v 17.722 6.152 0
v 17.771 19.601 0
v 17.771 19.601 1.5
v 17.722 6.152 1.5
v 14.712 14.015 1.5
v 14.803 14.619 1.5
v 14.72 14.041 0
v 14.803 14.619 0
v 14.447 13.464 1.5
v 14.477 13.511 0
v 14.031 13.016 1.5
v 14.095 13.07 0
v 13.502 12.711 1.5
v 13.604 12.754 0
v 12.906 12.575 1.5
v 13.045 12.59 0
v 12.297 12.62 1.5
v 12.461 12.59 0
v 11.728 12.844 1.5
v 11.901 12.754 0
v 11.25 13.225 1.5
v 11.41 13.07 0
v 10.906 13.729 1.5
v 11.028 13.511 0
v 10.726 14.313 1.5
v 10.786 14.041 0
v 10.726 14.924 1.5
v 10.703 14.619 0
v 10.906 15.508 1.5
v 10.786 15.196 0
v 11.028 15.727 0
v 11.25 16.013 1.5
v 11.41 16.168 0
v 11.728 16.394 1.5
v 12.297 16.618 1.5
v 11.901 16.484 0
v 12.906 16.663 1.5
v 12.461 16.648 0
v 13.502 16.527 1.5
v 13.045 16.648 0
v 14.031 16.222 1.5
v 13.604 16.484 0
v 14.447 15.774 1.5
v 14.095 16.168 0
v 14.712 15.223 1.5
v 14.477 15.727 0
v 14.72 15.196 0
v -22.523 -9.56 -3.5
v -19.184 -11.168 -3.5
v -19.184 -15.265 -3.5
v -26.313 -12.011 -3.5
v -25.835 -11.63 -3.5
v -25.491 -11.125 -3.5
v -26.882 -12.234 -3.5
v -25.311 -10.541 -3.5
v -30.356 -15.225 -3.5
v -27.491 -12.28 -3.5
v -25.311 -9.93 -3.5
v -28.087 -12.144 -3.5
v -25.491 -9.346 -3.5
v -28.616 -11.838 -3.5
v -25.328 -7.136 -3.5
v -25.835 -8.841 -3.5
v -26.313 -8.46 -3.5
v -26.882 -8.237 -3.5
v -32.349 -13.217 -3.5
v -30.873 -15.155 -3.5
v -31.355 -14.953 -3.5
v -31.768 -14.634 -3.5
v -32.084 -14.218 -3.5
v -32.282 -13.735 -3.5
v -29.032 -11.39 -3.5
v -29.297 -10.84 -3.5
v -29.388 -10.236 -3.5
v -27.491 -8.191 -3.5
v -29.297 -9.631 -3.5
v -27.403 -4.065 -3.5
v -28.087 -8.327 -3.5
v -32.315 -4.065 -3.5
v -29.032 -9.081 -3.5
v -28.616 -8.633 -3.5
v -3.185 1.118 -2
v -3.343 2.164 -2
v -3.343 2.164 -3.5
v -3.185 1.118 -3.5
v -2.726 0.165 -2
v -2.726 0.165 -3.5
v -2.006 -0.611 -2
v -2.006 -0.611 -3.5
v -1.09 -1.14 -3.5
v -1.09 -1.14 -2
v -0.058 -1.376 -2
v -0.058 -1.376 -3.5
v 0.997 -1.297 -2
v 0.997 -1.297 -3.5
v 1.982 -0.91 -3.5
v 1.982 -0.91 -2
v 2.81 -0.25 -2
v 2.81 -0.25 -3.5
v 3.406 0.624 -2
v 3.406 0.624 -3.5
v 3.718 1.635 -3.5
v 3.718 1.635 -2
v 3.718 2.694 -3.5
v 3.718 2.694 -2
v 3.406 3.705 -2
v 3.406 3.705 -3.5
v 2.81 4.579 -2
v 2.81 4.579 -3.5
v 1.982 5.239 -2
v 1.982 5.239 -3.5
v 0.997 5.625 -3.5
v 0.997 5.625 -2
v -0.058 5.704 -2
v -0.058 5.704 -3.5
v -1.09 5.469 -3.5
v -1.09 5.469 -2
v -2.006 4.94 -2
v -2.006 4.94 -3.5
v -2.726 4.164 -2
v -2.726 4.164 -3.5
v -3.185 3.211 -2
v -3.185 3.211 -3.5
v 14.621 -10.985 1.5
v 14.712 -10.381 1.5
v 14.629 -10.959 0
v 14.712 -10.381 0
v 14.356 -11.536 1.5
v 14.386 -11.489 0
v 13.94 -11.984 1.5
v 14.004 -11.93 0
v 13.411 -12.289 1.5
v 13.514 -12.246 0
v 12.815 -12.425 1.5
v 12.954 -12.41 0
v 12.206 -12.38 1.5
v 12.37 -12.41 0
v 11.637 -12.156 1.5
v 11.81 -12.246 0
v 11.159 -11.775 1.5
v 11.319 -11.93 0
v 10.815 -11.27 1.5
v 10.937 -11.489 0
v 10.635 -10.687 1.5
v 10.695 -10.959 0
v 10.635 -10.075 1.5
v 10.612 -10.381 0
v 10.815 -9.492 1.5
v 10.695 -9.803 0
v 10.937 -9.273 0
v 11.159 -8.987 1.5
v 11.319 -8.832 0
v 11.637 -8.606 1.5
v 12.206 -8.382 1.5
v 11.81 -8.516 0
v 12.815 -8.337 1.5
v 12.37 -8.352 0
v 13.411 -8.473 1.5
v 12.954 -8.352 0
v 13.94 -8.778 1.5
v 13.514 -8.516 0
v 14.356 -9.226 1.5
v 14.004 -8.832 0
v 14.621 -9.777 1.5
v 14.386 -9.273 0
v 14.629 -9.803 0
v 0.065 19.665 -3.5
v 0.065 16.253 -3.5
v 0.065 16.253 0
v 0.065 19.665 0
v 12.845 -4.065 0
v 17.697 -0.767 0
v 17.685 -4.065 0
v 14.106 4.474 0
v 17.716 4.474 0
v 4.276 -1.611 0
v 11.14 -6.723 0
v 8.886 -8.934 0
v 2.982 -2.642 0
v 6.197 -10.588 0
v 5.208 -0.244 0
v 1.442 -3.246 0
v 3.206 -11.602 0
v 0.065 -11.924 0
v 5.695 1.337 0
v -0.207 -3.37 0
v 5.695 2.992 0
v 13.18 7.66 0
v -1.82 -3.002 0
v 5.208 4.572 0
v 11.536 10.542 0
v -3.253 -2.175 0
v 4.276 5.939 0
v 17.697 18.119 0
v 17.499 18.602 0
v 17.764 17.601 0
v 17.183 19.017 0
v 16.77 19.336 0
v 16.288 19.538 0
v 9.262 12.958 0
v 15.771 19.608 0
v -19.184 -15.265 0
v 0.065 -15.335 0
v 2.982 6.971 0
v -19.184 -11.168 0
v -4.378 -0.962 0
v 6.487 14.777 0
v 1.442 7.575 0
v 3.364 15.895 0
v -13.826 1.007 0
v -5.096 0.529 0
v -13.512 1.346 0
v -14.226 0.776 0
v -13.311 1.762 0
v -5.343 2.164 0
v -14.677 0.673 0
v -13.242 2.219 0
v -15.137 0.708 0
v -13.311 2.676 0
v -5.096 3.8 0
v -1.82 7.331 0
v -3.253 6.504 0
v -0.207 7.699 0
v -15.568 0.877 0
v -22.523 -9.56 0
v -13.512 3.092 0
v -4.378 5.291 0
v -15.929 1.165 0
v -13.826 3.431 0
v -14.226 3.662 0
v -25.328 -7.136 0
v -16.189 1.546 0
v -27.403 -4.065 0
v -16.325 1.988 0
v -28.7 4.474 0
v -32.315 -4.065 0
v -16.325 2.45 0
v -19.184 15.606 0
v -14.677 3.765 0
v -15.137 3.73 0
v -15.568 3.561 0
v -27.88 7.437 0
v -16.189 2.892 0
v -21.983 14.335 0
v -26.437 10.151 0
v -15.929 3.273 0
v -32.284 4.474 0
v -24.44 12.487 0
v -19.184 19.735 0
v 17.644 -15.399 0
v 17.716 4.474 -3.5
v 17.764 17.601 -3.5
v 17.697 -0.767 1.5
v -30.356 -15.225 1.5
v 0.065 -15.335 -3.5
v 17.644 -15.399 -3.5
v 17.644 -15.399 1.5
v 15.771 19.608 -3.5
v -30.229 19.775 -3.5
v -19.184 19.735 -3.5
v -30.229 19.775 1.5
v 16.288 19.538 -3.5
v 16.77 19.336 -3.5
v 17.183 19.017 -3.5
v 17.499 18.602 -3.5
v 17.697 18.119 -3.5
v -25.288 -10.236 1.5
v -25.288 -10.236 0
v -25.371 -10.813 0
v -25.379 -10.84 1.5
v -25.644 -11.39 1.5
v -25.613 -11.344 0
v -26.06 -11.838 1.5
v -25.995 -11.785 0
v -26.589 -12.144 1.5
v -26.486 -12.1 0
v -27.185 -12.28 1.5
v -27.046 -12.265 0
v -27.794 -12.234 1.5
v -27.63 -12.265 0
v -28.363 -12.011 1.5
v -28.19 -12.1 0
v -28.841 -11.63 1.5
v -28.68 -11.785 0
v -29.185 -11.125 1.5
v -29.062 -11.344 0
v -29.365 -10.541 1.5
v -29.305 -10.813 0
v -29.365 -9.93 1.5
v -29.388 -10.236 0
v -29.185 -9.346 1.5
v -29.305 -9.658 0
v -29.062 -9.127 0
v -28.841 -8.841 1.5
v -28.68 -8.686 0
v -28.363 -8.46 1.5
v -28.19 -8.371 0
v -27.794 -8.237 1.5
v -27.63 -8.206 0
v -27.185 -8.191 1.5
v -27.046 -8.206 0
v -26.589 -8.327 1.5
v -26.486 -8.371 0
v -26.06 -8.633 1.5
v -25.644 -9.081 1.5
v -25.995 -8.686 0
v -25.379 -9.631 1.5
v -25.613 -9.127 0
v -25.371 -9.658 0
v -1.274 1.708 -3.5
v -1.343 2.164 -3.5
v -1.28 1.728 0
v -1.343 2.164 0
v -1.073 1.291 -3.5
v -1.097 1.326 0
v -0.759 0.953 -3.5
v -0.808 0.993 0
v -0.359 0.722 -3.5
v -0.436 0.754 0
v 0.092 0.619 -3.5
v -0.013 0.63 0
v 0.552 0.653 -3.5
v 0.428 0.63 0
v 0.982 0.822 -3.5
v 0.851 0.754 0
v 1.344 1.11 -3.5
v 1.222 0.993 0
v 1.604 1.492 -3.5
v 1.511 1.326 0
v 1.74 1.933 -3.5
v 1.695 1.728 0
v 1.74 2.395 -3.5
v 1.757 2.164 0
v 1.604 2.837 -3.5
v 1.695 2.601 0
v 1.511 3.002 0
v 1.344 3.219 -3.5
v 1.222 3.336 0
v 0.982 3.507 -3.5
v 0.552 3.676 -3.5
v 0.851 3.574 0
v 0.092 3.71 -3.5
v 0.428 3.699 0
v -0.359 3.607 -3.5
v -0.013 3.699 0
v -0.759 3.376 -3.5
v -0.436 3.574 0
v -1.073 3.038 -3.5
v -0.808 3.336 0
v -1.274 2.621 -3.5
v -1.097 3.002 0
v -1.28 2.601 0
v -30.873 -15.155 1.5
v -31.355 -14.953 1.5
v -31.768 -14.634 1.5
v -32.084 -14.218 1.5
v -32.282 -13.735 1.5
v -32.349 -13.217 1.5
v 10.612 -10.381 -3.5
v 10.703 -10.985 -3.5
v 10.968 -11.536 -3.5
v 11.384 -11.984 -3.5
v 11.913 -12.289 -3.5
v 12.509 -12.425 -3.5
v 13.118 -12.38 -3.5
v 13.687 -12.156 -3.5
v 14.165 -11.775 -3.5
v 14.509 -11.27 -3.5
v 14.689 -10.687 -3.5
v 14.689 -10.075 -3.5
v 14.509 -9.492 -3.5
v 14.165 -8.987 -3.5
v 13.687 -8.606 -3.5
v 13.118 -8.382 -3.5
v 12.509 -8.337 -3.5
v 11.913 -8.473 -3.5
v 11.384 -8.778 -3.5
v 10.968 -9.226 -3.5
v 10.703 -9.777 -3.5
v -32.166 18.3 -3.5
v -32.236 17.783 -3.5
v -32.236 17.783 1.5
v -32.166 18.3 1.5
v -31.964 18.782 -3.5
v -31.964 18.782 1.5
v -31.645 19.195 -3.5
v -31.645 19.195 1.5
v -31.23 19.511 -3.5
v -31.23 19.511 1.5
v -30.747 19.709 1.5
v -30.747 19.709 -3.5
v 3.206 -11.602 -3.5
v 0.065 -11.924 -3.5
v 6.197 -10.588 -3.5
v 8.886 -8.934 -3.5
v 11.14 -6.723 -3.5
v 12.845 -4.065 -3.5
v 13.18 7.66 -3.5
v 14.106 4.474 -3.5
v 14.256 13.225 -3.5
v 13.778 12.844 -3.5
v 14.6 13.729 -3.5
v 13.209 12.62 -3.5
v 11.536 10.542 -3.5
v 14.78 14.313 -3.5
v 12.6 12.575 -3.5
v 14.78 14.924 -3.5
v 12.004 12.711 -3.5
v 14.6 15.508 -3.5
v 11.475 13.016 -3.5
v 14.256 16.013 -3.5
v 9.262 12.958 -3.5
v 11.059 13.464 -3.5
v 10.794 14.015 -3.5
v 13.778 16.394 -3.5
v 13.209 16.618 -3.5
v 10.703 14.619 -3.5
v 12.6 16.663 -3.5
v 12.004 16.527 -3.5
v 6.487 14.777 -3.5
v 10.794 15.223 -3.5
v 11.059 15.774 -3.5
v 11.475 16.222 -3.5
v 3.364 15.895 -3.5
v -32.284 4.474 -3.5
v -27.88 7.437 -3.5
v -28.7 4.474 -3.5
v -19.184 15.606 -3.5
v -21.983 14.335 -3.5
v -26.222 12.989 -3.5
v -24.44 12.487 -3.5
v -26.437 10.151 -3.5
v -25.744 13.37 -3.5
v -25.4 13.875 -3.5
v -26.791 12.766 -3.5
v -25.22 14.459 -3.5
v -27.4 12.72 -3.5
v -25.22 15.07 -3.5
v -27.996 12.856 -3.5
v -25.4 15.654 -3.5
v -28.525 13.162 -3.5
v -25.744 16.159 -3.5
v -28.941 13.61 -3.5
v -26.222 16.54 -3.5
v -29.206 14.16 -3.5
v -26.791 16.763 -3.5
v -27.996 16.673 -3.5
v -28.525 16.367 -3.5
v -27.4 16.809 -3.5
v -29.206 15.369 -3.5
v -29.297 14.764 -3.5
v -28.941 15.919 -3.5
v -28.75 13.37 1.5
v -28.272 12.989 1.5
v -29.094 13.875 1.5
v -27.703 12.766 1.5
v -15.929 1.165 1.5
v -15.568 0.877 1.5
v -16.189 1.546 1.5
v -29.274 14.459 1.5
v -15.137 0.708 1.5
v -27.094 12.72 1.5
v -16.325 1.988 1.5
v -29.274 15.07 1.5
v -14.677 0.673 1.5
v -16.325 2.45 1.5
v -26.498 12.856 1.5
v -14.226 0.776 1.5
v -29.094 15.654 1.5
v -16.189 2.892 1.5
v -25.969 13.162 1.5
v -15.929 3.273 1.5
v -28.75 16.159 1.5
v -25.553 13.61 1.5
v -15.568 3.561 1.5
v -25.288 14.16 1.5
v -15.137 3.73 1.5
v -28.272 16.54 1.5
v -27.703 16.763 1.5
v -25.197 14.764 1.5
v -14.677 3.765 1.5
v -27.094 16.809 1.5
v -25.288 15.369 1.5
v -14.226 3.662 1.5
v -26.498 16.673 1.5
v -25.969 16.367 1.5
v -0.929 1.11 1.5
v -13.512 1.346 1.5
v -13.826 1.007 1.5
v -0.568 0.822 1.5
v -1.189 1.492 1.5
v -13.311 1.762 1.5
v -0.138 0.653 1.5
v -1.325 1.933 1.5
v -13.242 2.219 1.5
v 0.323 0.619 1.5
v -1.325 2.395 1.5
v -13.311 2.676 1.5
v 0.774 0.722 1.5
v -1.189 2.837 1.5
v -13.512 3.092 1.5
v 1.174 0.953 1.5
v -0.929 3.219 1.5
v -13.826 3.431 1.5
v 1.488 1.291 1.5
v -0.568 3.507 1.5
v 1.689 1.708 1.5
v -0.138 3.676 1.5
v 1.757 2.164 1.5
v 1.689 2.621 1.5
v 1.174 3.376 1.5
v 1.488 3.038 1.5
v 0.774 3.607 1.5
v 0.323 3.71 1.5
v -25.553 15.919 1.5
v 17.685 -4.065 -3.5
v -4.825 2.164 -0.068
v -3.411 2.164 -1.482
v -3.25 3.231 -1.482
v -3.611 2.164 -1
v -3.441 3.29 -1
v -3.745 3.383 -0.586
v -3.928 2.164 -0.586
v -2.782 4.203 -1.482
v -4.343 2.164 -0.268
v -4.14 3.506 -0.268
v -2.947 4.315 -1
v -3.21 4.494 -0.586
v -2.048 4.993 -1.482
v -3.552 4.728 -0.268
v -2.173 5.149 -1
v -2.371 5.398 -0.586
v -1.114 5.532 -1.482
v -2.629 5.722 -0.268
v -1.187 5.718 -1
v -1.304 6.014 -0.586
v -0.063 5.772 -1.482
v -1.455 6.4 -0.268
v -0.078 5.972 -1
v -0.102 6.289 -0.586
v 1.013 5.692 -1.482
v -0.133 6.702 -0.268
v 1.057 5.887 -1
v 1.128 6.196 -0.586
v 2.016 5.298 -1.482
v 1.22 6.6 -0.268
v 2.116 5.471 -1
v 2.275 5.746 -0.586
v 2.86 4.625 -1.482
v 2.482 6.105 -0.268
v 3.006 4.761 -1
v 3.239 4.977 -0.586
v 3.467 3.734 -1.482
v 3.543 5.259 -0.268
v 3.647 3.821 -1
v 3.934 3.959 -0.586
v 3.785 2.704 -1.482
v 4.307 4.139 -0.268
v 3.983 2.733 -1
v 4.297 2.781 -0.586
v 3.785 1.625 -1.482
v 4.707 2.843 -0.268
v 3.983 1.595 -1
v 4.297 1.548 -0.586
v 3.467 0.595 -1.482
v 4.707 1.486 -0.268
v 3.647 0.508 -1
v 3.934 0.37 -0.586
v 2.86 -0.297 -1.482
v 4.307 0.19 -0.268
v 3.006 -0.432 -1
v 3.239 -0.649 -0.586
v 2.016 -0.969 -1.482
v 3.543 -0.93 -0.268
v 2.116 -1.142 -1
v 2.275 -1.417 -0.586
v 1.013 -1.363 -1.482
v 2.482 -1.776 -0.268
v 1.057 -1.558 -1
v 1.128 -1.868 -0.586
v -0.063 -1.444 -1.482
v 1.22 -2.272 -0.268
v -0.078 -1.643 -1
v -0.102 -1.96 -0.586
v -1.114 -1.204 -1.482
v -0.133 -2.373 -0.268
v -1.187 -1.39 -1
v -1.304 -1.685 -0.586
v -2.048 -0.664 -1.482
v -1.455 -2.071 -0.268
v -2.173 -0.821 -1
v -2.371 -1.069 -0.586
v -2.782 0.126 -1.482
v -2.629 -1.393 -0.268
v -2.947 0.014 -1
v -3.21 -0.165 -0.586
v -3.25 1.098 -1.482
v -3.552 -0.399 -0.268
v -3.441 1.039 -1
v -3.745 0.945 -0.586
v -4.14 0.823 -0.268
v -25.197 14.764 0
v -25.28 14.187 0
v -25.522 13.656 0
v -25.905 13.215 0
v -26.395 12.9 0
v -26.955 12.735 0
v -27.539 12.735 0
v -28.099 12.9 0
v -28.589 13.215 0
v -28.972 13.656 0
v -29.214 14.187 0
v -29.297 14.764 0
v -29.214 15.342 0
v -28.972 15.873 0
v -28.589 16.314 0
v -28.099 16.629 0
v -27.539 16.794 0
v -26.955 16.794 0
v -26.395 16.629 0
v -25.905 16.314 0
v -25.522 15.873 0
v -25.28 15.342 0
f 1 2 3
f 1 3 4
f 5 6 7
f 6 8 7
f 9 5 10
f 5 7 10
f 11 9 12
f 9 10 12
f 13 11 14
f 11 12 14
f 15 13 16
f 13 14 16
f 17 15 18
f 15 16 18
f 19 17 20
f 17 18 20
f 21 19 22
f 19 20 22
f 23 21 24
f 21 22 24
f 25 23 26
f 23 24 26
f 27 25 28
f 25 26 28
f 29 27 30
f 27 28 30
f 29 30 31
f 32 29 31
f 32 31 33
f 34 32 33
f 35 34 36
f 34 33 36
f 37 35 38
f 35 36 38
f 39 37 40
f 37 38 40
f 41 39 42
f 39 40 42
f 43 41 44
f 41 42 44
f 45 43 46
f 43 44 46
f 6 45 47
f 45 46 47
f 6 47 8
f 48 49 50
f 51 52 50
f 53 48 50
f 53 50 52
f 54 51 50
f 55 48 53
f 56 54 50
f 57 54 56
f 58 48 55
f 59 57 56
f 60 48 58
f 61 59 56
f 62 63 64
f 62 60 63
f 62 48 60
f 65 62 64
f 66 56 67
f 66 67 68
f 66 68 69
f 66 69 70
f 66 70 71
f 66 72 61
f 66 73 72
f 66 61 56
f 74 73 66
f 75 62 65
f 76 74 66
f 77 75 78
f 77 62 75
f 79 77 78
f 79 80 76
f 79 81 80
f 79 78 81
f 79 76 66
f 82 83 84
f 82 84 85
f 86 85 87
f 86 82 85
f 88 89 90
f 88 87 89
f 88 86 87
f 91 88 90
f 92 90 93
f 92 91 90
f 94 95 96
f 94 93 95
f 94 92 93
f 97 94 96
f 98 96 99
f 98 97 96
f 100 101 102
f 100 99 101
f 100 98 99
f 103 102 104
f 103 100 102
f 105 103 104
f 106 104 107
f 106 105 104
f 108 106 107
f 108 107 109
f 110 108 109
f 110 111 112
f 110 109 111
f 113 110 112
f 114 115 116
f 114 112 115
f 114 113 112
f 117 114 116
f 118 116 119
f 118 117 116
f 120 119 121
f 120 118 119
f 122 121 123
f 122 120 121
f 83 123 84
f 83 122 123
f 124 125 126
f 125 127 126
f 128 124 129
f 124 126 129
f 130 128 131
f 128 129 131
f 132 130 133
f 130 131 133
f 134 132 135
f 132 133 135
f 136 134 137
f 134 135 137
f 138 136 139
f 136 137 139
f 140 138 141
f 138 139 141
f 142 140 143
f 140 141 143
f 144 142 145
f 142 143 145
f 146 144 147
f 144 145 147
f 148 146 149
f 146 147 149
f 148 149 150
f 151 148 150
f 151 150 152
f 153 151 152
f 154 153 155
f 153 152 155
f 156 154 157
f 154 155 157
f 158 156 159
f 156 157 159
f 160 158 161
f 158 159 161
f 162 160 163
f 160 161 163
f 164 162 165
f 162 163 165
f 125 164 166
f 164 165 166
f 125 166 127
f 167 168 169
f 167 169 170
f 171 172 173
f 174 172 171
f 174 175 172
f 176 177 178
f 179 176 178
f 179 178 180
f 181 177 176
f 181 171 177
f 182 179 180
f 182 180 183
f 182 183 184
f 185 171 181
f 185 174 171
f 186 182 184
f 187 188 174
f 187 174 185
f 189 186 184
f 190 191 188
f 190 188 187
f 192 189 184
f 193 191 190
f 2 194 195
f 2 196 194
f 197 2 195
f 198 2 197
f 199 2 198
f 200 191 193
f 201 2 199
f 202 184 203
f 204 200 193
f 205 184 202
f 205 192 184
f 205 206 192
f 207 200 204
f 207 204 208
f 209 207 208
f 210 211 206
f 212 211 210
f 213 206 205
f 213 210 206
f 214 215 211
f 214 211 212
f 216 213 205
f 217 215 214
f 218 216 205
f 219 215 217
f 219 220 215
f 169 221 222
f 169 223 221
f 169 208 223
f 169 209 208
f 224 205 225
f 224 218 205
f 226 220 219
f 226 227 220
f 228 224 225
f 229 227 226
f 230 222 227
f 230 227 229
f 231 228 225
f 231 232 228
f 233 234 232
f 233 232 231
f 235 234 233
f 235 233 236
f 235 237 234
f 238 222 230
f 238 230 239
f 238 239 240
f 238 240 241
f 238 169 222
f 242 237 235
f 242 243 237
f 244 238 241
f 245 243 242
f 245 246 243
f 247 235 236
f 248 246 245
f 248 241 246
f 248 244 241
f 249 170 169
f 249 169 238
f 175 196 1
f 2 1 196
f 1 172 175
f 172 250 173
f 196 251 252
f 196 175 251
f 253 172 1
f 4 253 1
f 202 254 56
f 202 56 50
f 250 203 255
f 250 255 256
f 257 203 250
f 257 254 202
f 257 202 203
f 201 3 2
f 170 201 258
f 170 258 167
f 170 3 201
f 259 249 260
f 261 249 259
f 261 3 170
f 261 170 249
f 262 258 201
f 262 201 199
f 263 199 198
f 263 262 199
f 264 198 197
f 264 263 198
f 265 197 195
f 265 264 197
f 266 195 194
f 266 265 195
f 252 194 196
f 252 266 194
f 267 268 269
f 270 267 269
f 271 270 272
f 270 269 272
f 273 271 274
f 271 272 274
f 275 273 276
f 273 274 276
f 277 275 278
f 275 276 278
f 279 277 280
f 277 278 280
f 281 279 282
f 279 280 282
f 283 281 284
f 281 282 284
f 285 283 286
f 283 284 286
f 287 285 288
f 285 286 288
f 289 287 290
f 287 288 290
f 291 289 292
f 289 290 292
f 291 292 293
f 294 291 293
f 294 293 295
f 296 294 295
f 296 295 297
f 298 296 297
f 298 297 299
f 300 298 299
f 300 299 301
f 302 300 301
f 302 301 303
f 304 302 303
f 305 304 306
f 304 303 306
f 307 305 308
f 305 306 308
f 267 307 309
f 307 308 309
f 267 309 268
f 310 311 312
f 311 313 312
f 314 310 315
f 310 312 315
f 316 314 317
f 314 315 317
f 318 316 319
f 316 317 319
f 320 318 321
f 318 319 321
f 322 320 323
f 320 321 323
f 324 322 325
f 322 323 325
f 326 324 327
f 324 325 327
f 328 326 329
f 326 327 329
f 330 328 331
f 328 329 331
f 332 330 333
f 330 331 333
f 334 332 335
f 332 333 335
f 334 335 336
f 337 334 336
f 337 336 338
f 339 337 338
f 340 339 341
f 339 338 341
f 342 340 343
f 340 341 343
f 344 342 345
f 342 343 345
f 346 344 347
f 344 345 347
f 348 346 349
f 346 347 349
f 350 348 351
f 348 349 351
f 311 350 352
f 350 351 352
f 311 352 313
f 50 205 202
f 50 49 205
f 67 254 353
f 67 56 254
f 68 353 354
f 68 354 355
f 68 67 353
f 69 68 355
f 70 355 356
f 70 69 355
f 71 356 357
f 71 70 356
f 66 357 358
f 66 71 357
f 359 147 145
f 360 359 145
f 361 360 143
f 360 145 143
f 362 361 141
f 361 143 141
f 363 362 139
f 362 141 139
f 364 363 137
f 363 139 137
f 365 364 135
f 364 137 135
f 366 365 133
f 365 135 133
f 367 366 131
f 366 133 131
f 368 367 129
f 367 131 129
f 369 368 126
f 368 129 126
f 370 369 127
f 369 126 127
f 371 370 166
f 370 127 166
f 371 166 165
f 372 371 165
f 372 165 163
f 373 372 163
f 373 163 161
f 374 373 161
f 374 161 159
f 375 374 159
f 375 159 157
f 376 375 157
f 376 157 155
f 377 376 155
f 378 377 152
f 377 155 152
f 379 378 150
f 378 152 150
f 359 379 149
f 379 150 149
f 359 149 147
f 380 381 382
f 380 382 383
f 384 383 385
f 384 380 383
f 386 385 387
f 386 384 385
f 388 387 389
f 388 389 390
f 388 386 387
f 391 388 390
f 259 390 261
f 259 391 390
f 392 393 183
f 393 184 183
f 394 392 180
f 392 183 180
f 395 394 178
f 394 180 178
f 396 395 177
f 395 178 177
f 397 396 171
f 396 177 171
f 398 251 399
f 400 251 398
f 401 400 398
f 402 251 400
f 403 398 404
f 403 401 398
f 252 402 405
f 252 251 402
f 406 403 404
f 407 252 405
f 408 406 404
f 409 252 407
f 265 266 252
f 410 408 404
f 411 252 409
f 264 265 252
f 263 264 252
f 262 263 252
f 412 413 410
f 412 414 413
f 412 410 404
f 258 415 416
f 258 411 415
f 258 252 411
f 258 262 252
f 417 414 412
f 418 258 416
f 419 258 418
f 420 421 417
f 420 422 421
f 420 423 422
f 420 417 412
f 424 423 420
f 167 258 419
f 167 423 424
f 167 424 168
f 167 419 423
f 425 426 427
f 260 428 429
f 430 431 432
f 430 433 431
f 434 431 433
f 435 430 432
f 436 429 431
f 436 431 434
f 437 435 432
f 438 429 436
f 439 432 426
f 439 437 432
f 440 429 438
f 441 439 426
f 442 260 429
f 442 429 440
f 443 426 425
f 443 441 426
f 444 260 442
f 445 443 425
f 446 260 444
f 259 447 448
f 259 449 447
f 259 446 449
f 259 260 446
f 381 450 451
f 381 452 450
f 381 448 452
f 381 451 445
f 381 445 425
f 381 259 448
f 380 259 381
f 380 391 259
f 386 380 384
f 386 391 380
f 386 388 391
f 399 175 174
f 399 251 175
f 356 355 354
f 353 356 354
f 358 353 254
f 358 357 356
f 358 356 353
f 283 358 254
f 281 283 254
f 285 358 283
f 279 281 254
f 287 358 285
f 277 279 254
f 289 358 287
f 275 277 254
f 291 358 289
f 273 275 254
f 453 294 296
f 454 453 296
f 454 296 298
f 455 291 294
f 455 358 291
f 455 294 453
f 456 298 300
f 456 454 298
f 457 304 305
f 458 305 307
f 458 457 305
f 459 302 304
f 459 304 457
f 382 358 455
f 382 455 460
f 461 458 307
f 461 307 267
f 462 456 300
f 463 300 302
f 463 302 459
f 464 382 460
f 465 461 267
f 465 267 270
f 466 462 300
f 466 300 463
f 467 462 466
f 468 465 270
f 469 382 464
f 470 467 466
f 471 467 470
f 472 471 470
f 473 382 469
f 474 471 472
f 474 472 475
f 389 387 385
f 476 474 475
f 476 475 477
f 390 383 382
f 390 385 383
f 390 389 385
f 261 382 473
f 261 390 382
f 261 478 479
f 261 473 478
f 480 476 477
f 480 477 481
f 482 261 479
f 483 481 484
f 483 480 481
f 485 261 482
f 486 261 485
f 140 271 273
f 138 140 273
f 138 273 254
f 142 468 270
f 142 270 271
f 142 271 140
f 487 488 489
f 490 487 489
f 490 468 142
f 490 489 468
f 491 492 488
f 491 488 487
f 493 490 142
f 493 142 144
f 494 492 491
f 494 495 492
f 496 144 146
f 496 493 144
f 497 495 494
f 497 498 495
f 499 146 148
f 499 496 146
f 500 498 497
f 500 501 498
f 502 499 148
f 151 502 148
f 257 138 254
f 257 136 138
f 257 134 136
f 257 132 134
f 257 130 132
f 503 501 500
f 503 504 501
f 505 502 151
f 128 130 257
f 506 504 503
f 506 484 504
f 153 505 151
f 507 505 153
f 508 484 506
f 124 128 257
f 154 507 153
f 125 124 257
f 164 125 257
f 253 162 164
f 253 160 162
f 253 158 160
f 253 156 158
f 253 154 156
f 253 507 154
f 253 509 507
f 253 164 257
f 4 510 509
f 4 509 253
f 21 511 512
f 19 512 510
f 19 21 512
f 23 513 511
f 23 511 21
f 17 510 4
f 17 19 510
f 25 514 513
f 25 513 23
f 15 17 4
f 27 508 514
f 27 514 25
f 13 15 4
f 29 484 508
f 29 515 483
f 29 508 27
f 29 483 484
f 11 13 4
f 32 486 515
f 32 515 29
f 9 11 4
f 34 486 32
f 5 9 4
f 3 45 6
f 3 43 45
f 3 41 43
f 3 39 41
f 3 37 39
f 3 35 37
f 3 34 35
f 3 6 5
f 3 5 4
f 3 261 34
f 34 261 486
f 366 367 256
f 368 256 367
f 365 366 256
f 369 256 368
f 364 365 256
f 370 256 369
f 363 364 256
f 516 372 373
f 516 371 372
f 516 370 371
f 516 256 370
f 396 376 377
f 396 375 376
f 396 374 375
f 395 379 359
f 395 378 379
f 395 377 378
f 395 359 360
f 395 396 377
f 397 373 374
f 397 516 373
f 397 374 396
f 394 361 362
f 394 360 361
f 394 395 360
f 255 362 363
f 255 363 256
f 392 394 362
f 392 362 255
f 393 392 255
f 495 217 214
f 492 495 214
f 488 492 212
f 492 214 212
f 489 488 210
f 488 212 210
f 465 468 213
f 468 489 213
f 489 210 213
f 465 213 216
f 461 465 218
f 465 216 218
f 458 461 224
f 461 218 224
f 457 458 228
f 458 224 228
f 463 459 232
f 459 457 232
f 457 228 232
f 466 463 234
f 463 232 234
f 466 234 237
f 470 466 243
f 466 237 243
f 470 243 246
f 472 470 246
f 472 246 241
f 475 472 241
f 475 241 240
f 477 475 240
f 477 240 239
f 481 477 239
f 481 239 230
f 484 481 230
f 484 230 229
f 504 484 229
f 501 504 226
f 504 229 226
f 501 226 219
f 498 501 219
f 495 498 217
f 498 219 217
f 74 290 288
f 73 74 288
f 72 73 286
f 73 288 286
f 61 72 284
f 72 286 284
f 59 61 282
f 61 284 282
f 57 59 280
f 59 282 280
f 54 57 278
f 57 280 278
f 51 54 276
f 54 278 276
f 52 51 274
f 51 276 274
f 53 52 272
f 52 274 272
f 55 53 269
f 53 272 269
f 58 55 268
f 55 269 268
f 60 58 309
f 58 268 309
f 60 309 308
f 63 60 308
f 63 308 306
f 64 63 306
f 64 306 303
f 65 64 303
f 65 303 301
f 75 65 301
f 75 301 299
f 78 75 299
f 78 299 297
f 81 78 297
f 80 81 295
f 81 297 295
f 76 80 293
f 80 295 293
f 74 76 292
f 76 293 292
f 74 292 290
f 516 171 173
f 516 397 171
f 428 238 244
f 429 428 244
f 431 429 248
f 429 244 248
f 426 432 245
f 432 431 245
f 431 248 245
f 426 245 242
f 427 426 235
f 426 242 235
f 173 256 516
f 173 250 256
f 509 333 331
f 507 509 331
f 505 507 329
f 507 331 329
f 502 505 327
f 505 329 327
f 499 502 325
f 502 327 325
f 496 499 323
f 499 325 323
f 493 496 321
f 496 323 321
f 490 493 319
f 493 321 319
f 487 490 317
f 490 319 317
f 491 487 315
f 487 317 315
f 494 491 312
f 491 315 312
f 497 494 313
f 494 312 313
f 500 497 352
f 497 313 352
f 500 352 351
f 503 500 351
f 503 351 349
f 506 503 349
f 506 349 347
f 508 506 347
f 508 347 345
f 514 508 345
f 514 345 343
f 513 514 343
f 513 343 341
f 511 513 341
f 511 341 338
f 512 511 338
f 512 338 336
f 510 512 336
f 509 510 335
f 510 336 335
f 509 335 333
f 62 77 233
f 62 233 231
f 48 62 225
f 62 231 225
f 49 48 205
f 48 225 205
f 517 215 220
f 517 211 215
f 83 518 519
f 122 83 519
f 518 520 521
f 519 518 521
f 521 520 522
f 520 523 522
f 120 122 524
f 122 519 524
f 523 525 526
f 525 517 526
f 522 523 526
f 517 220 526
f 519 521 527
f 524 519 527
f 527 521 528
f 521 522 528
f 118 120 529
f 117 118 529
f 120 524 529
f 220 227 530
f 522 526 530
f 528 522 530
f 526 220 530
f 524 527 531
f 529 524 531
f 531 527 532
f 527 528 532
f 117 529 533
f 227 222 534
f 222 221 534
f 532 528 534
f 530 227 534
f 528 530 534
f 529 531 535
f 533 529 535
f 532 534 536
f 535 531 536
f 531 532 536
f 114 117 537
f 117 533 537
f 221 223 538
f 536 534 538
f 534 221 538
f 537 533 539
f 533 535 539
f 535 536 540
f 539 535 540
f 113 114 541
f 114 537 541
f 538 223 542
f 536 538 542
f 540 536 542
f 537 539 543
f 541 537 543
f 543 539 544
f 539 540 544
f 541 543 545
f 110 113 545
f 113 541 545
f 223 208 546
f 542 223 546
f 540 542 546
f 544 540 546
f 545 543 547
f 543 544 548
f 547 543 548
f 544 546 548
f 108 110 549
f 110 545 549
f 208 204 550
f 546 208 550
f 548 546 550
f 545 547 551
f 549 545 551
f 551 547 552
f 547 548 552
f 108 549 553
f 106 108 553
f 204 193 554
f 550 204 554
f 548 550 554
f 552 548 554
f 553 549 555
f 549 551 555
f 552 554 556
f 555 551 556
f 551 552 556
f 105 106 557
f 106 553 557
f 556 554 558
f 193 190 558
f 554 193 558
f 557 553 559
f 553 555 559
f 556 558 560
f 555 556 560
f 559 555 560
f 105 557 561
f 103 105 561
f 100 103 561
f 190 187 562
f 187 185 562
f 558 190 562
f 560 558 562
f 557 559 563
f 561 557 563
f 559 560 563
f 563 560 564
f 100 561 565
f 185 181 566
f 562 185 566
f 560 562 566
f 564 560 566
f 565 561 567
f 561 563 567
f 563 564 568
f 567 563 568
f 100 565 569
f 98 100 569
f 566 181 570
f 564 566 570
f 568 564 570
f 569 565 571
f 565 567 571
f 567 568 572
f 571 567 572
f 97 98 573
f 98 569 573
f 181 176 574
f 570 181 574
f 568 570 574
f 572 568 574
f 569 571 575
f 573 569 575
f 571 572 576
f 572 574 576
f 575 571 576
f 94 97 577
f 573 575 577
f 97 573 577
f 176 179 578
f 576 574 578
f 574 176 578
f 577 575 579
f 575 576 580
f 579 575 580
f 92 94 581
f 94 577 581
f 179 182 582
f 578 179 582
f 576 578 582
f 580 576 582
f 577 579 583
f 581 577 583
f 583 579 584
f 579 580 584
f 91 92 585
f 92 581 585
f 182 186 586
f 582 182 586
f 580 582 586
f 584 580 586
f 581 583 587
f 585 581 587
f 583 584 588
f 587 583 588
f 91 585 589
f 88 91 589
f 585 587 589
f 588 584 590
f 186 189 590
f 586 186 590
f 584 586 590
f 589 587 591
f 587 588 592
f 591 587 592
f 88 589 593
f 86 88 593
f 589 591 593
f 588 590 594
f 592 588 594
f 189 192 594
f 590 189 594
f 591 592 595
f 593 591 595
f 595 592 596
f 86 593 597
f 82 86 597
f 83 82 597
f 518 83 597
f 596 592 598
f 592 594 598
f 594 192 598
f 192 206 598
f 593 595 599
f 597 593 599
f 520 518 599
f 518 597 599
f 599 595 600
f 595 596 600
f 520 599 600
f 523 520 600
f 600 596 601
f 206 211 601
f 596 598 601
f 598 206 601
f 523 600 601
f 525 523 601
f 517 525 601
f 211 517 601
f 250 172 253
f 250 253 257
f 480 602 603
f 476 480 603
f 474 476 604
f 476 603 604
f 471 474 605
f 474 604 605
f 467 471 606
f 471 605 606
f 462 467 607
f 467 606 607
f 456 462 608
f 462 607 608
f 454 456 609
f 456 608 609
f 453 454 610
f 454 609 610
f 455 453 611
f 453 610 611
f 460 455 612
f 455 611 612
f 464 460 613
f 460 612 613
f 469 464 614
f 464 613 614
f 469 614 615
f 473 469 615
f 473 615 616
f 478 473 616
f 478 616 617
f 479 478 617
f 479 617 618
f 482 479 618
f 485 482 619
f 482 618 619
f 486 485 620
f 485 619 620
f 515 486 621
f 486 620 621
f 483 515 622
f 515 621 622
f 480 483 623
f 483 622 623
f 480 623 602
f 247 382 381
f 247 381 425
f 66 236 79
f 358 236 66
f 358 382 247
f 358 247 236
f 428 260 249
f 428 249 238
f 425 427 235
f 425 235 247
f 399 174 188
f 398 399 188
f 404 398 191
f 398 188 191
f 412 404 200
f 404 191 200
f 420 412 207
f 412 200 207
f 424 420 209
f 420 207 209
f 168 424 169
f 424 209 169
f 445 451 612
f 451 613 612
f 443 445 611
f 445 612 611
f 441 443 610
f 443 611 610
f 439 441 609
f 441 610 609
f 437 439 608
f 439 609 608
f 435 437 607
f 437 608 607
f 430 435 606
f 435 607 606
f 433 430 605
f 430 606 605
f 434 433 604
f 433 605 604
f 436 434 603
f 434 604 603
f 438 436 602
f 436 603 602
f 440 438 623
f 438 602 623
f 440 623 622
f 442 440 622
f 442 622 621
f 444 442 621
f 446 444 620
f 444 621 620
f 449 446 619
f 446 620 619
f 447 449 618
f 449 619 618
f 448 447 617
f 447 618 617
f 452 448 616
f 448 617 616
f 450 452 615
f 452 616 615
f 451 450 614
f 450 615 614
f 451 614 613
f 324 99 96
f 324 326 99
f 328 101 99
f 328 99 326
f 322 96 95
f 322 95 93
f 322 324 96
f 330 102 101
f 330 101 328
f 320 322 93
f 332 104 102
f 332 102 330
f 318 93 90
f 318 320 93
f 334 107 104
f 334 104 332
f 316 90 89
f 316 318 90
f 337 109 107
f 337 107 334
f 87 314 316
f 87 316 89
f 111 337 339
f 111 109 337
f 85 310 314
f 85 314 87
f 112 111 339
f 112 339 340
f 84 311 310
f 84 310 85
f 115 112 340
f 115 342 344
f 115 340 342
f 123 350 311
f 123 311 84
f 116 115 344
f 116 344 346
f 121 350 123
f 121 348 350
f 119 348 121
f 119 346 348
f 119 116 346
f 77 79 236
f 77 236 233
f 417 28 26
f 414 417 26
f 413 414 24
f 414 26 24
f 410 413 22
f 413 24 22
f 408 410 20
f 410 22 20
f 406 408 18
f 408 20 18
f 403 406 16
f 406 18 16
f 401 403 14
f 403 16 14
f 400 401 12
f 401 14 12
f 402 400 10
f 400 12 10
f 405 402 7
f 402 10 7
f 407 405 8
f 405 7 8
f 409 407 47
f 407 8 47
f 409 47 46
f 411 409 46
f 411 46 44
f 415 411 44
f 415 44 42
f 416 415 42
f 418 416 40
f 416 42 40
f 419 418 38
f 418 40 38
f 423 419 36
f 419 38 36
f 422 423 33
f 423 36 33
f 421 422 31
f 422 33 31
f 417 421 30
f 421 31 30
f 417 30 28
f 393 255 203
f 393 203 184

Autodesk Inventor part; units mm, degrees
ref_plane "YZ Plane" through (0, 0, 0) normal (1, 0, 0) x (0, 1, 0)
ref_plane "XZ Plane" through (0, 0, 0) normal (0, 1, 0) x (-1, 0, 0)
ref_plane "XY Plane" through (0, 0, 0) normal (0, 0, 1) x (1, 0, 0)
sketch "Skizze1" plane through (0, 0, 0) normal (0, 0, 1) x (1, 0, 0)
  line L0 (17.6969, -0.7673) -> (8.7277, -0.7347) projected
  arc A0 (8.2588, 6.1863) -> (8.7277, -0.7347) centre (0.2074, 2.1644) ccw projected
  line L1 (8.2588, 6.1863) -> (17.722, 6.1519) projected
  line L2 (17.7709, 19.6007) -> (17.722, 6.1519) projected
  line L3 (-32.2287, 19.7825) -> (17.7709, 19.6007) projected
  line L4 (-32.356, -15.2173) -> (-32.2287, 19.7825) projected
  line L5 (17.6436, -15.3991) -> (-32.356, -15.2173) projected
  line L6 (17.6969, -0.7673) -> (17.6436, -15.3991) projected
  circle A1 centre (-14.7925, 2.219) radius 1.45 projected
  circle A2 centre (-14.7925, 2.219) radius 1.55
  circle A3 centre (0.2074, 2.1644) radius 1.55
  line L7 (17.6969, -0.7673) -> (17.722, 6.1519)
  circle A4 centre (-27.247, 14.7644) radius 2.05 projected
  circle A5 centre (12.6619, -10.381) radius 2.05 projected
  circle A6 centre (12.7528, 14.6189) radius 2.05 projected
  circle A7 centre (-27.3379, -10.2355) radius 2.05 projected
  point P0 (0, 0)
  dimension "d25" = 3.1
  dimension "d26" = 3.1
extrude "Extrusion1" add sketch "Skizze1" along normal blind 1.5 contours L6 L5 L4 L3 L2 L1 A0 L0 | L0 A0 L1 L7
sketch "Skizze6" plane through (0, 0, 0) normal (0, 0, -1) x (-1, 0, 0)
  circle A0 centre (14.7925, 2.219) radius 1.55 projected
  circle A1 centre (-0.2074, 2.1644) radius 1.55 projected
  circle A2 centre (-0.2074, 2.1644) radius 14.0891
  circle A3 centre (14.7925, 2.219) radius 14.0891
  line L0 (32.356, -15.2173) -> (-17.6436, -15.3991) projected
  line L1 (32.2287, 19.7825) -> (32.356, -15.2173) projected
  line L2 (-17.7709, 19.6007) -> (32.2287, 19.7825) projected
  line L3 (-17.6436, -15.3991) -> (-17.7709, 19.6007)
  line L4 (32.2287, 19.7825) -> (-17.7709, 19.6007)
  line L5 (32.356, -15.2173) -> (32.2287, 19.7825)
  line L6 (32.356, -15.2173) -> (-17.6436, -15.3991)
  circle A4 centre (27.3379, -10.2355) radius 2.05 projected
  circle A5 centre (-12.7528, 14.6189) radius 2.05 projected
  circle A6 centre (-12.6619, -10.381) radius 2.05 projected
  circle A7 centre (27.247, 14.7644) radius 2.05 projected
  circle A8 centre (-12.7528, 14.6189) radius 2.05
  circle A9 centre (27.247, 14.7644) radius 2.05
  circle A10 centre (27.3379, -10.2355) radius 2.05
  circle A11 centre (-12.6619, -10.381) radius 2.05
  point P0 (0, 0)
extrude "Extrusion7" add sketch "Skizze6" along normal blind 3.5
sketch "Skizze7" plane through (0, 0, -3.5) normal (0, 0, -1) x (-1, 0, 0)
  line L0 (-21.514, 4.474) -> (38.6582, 4.474)
  line L1 (38.6582, 4.474) -> (38.6582, -4.0646)
  line L2 (38.6582, -4.0646) -> (-21.514, -4.0646)
  line L3 (-21.514, -4.0646) -> (-21.514, 4.474)
  line L4 (-0.0651, 23.7233) -> (19.1842, 23.7233)
  line L5 (19.1842, 23.7233) -> (19.1842, -21.5163)
  line L6 (19.1842, -21.5163) -> (-0.0651, -21.5163)
  line L7 (-0.0651, -21.5163) -> (-0.0651, 23.7233)
  point P0 (0, 0)
extrude "Extrusion8" cut sketch "Skizze7" against normal up to surface (3.5 mm away)
sketch "Skizze2" plane through (0, 0, 0) normal (0, 0, -1) x (-1, 0, 0)
  circle A0 centre (-0.2074, 2.1644) radius 1.55 projected
  arc A1 (-12.8448, -4.0646) -> (-0.0651, -11.924) centre (-0.2074, 2.1644) ccw projected
  circle A2 centre (-0.2074, 2.1644) radius 3.55
  point P0 (0, 0)
  dimension "d27" = 2
extrude "Extrusion2" add sketch "Skizze2" along normal blind 3.5
fillet "Rundung5" radius 2 4 edges at (3.7574, 2.1644, 0) (-32.356, -15.2173, -1) (17.7709, 19.6007, -1) (-32.2287, 19.7825, -1)
properties part number "GehäuseBack"
